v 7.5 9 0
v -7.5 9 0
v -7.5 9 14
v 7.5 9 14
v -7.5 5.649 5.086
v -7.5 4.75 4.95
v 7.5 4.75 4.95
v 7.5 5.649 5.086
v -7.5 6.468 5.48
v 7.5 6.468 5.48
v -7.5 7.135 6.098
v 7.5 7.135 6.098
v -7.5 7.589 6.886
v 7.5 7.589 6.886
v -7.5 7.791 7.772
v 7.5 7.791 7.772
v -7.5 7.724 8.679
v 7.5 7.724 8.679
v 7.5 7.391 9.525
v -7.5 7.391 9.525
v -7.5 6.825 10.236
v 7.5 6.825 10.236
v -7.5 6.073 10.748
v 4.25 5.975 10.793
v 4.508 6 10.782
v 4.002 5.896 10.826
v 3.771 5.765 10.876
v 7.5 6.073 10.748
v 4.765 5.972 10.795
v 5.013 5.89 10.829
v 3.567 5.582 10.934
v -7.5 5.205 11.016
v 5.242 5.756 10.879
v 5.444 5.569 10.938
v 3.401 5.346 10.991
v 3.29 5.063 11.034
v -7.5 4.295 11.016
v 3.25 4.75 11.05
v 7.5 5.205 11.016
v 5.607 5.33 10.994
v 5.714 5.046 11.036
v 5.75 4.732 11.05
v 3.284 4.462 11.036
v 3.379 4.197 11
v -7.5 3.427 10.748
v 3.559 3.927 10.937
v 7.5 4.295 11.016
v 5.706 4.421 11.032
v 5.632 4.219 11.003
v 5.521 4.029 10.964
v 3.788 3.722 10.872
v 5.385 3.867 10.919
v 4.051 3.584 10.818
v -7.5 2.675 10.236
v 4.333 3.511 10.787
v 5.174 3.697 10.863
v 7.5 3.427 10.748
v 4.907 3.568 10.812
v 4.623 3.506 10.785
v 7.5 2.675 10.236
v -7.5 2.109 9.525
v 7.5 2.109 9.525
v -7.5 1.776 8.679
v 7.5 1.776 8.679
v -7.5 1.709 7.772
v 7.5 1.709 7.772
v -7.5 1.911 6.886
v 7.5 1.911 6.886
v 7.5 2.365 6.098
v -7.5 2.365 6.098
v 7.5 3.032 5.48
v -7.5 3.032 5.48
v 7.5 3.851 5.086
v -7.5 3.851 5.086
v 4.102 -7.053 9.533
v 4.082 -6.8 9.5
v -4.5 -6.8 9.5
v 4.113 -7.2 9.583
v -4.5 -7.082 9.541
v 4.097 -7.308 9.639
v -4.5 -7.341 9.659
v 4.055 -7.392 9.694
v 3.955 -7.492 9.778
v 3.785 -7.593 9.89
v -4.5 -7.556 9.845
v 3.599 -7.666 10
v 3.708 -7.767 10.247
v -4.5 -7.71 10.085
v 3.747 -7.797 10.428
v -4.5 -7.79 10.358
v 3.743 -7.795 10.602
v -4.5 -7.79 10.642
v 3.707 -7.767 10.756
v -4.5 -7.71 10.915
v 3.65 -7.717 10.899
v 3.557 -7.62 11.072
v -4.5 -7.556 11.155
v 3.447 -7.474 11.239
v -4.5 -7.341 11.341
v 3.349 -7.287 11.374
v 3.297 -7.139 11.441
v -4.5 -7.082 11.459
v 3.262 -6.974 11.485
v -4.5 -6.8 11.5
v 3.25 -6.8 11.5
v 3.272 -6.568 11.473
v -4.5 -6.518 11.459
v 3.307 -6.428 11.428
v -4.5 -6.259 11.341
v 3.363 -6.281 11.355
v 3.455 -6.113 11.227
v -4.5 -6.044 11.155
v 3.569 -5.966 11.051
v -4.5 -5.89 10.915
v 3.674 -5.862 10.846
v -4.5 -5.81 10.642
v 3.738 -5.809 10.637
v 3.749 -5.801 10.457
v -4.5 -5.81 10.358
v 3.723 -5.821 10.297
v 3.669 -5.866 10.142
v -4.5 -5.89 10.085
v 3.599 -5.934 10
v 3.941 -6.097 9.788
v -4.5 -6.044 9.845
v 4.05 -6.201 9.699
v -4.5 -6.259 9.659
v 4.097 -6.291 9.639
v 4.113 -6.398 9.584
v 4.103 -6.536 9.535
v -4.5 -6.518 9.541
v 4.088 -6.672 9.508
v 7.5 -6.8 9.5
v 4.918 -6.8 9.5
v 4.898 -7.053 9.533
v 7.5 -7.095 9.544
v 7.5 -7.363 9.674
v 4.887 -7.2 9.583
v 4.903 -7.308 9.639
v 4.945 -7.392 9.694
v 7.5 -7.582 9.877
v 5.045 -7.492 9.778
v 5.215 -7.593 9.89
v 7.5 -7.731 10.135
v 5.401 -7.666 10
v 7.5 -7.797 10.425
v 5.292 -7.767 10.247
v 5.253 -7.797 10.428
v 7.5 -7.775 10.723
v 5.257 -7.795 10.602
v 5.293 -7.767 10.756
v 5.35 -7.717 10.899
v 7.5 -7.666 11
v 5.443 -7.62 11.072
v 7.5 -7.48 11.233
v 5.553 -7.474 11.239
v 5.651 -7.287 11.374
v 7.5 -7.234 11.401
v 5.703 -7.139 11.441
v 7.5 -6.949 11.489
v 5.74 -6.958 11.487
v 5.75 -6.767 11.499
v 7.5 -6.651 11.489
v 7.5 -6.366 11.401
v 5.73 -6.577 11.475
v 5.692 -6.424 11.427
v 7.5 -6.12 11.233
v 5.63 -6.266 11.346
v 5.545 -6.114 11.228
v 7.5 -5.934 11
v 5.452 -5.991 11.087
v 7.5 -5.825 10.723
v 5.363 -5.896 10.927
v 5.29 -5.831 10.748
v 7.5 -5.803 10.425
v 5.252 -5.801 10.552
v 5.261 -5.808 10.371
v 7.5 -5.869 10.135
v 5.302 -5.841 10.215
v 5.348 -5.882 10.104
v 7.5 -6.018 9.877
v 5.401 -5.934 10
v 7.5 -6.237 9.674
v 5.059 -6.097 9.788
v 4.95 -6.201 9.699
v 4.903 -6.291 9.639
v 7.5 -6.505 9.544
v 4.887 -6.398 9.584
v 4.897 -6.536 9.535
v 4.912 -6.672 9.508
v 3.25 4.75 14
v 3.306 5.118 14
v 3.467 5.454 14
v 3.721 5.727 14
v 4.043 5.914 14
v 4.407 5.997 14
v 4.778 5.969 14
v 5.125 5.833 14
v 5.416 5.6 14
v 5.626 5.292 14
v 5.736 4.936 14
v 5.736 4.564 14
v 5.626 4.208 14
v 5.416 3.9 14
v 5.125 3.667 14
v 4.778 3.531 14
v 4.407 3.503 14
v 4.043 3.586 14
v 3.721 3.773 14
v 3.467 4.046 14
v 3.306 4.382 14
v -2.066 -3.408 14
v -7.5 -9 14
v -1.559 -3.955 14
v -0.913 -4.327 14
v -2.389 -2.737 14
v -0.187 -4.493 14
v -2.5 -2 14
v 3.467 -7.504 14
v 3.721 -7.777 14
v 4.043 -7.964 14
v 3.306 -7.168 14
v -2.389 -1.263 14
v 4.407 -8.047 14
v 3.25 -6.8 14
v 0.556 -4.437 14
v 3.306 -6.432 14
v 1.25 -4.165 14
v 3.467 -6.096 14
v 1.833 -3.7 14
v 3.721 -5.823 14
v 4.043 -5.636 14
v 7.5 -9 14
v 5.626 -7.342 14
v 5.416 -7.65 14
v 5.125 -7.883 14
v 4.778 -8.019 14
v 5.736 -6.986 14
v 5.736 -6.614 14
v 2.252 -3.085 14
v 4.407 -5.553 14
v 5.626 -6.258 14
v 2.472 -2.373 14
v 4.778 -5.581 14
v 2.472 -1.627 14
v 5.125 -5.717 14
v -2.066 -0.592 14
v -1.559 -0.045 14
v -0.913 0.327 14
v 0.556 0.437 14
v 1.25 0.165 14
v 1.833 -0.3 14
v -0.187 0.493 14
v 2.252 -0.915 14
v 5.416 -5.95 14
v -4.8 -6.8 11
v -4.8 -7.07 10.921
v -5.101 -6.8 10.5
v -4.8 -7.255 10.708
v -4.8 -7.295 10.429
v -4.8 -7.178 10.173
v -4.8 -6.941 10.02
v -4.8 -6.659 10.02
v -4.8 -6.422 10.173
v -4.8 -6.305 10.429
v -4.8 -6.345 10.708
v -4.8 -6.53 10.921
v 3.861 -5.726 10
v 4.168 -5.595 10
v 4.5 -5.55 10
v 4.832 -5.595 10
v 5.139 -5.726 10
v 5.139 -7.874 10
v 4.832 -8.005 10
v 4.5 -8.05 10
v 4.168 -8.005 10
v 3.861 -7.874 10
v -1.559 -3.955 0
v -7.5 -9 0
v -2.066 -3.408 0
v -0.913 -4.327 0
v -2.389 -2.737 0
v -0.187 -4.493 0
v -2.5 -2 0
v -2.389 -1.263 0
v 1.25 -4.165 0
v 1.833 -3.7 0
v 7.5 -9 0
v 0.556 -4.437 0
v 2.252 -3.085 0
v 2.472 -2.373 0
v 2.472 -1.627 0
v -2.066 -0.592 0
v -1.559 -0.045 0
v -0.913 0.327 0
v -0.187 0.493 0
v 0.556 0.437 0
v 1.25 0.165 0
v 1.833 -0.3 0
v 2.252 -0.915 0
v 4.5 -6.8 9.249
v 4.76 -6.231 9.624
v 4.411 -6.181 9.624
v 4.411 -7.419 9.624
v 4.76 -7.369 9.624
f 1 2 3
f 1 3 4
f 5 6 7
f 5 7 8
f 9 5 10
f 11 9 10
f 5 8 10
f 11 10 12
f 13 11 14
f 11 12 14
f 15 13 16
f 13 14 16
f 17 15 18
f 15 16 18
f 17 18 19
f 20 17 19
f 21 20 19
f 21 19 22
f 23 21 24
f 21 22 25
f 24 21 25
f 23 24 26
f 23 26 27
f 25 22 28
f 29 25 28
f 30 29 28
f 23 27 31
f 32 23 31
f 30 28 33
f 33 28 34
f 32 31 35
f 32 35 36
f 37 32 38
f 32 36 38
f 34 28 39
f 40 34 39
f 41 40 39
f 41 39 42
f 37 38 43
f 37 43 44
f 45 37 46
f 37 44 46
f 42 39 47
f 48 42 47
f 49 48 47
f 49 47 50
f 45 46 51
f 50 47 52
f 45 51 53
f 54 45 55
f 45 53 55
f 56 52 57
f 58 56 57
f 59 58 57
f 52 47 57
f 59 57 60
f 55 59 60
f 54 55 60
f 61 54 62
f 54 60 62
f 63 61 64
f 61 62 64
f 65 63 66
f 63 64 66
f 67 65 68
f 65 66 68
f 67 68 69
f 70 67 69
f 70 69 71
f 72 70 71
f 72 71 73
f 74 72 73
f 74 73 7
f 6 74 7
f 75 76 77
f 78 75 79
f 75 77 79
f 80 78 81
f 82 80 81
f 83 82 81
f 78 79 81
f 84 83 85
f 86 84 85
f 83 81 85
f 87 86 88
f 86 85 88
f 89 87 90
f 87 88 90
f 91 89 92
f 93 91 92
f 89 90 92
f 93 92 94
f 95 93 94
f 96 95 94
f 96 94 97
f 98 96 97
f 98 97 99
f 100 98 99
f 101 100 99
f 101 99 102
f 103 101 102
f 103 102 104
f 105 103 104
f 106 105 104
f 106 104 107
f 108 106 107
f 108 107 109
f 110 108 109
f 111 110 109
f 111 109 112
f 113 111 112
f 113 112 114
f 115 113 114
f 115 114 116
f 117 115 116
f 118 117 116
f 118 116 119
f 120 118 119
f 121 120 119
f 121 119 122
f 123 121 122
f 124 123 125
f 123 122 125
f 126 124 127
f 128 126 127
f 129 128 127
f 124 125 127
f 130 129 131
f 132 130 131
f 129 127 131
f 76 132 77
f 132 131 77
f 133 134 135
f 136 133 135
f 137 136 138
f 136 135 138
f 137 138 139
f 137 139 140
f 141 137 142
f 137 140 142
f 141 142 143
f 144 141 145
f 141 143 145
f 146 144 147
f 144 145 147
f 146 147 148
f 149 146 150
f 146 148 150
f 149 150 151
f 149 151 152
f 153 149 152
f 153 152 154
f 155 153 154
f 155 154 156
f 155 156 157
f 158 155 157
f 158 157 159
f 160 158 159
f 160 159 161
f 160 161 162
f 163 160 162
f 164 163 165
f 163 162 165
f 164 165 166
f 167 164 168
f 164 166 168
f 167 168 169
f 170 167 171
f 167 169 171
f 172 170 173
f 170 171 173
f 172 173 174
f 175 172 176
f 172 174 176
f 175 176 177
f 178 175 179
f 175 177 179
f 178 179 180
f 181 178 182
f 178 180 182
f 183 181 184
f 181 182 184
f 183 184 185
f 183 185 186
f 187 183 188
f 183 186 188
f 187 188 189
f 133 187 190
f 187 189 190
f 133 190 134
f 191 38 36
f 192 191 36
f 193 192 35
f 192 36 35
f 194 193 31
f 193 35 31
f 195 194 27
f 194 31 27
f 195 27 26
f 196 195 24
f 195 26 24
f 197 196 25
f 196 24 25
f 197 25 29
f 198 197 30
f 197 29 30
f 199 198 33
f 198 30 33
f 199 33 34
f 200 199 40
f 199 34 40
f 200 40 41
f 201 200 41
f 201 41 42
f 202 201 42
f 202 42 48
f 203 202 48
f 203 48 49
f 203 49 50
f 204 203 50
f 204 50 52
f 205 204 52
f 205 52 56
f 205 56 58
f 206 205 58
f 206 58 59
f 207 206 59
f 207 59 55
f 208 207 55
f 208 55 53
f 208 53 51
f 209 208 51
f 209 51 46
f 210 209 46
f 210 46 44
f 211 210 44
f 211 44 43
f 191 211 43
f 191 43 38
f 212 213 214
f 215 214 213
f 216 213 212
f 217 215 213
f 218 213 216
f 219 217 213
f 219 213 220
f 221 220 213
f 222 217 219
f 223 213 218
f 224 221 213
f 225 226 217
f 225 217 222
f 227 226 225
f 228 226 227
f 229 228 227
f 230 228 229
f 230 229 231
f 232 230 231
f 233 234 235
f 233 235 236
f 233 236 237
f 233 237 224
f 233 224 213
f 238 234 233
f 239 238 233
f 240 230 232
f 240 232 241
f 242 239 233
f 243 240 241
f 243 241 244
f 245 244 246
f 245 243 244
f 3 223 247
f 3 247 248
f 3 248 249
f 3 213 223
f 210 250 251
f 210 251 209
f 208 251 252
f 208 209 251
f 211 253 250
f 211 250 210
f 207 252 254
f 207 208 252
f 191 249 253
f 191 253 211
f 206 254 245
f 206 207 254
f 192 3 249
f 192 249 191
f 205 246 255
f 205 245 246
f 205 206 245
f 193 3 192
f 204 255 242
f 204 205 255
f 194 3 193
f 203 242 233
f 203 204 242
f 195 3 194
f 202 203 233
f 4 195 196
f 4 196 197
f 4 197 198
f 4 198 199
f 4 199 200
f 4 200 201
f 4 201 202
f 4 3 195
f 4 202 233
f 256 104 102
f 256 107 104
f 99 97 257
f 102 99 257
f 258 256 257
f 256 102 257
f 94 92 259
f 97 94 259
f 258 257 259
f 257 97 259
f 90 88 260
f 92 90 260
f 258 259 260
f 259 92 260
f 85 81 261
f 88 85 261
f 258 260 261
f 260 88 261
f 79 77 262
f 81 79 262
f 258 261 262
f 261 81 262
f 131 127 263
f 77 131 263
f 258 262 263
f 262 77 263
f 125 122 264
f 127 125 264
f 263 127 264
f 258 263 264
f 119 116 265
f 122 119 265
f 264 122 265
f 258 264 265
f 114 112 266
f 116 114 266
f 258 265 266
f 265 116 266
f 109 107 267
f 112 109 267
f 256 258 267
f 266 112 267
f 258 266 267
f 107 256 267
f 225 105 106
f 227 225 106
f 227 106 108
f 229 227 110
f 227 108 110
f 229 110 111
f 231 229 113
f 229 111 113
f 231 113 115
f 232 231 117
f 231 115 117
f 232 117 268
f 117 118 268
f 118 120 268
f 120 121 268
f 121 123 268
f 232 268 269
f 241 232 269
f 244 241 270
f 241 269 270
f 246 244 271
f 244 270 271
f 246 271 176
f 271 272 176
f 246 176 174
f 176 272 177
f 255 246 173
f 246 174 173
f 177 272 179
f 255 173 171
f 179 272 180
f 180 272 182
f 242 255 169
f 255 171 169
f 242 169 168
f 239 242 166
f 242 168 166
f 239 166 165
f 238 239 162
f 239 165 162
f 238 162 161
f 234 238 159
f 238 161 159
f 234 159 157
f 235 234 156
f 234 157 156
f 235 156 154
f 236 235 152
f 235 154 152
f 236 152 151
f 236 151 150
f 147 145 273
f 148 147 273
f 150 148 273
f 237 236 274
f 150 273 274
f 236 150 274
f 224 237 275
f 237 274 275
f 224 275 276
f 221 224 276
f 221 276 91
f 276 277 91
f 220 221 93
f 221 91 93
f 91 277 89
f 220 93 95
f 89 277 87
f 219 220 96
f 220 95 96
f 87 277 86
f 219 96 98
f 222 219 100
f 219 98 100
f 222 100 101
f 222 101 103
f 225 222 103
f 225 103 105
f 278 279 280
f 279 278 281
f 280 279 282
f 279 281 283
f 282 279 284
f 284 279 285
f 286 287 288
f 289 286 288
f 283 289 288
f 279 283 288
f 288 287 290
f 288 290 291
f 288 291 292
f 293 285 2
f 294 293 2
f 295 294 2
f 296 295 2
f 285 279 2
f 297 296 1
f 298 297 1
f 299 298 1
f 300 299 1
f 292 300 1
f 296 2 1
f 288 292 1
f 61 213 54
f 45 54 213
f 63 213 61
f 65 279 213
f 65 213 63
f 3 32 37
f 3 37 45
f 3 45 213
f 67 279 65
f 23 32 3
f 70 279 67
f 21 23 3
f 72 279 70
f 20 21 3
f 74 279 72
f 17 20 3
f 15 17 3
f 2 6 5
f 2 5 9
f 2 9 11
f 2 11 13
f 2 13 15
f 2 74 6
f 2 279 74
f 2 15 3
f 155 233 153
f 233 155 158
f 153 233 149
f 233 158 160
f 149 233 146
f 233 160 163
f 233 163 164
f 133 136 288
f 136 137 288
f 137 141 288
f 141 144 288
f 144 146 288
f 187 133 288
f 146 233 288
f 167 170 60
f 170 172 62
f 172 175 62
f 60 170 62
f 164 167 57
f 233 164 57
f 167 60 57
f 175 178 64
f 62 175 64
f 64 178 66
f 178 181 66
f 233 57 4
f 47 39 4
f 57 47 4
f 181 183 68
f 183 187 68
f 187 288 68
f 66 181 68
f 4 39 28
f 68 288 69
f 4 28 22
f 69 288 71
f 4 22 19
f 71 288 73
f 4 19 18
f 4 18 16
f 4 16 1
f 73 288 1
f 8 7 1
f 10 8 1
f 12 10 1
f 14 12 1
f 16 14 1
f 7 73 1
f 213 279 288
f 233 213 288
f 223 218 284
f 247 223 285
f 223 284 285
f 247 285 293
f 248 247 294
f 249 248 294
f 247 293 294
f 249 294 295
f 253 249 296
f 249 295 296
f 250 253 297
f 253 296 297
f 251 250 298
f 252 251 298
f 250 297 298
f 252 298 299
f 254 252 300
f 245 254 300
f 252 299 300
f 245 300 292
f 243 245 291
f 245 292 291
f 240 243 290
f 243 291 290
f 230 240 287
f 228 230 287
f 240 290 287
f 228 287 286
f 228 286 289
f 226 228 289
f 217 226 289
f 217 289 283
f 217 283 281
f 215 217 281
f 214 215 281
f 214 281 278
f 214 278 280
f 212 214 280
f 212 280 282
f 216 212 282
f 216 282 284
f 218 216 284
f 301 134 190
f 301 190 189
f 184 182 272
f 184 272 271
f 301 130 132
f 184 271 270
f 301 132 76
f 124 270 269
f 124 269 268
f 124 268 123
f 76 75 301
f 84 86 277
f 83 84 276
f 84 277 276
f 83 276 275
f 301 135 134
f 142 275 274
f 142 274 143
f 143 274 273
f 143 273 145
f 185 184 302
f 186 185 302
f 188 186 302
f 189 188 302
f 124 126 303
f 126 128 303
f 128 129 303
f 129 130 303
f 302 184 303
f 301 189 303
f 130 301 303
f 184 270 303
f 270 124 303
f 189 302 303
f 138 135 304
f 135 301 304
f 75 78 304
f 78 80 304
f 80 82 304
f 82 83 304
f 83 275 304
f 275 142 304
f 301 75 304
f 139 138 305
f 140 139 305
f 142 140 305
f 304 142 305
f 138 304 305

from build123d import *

# Parameters (mm, degrees)
SKETCH1_W                           = 15
SKETCH1_H                           = 18
BOSS_EXTRUDE1_DEPTH                 = 14
SKETCH2_R                           = 2.5
CUT_EXTRUDE1_DEPTH                  = 15
SKETCH3_R                           = 3.05
CUT_EXTRUDE2_DEPTH                  = 16
TALADRO_ROSCADO_M31_D               = 2.5
TALADRO_ROSCADO_M31_DEPTH           = 4
TALADRO_ROSCADO_M31_TIP             = 0.751075774
DI_METRO_DE_TALADRO_2_8_2_8_1_D     = 2
DI_METRO_DE_TALADRO_2_8_2_8_1_DEPTH = 12
DI_METRO_DE_TALADRO_2_8_2_8_1_TIP   = 0.600860619


with BuildPart() as part:
    # Sketch1 → Boss-Extrude1 (new body)
    with BuildSketch(Plane.XY):
        Rectangle(SKETCH1_W, SKETCH1_H)
    extrude(amount=BOSS_EXTRUDE1_DEPTH)

    # Sketch2 → Cut-Extrude1 (cut, through all)
    with BuildSketch(Plane(origin=(0, 0, 0), x_dir=(-1, 0, 0), z_dir=(0, 0, -1))):
        with Locations((0, -2)):
            Circle(SKETCH2_R)
    extrude(amount=-CUT_EXTRUDE1_DEPTH, mode=Mode.SUBTRACT)

    # Sketch3 → Cut-Extrude2 (cut, through all)
    with BuildSketch(Plane(origin=(7.5, 0, 0), x_dir=(0, 0, -1), z_dir=(1, 0, 0))):
        with Locations((-8, 4.75)):
            Circle(SKETCH3_R)
    extrude(amount=-CUT_EXTRUDE2_DEPTH, mode=Mode.SUBTRACT)

    # Taladro roscado M31
    with Locations(Plane(origin=(-2.648652683, -2.97524228, 14), x_dir=(1, 0, 0), z_dir=(0, 0, 1))):
        with Locations((7.148652683, 7.72524228), (7.148652683, -3.82475772)):
            Hole(TALADRO_ROSCADO_M31_D / 2, depth=TALADRO_ROSCADO_M31_DEPTH)
            with Locations((0, 0, -(TALADRO_ROSCADO_M31_DEPTH + TALADRO_ROSCADO_M31_TIP / 2))):  # 118° drill point
                Cone(0, TALADRO_ROSCADO_M31_D / 2, TALADRO_ROSCADO_M31_TIP, mode=Mode.SUBTRACT)

    # Diámetro de taladro Ø2.8 (2.8)1
    with Locations(Plane(origin=(7.5, -6.8, 10.5), x_dir=(0, 0, 1), z_dir=(1, 0, 0))):
        with Locations((0, 0)):
            Hole(DI_METRO_DE_TALADRO_2_8_2_8_1_D / 2, depth=DI_METRO_DE_TALADRO_2_8_2_8_1_DEPTH)
            with Locations((0, 0, -(DI_METRO_DE_TALADRO_2_8_2_8_1_DEPTH + DI_METRO_DE_TALADRO_2_8_2_8_1_TIP / 2))):  # 118° drill point
                Cone(0, DI_METRO_DE_TALADRO_2_8_2_8_1_D / 2, DI_METRO_DE_TALADRO_2_8_2_8_1_TIP, mode=Mode.SUBTRACT)


solid = part.part
